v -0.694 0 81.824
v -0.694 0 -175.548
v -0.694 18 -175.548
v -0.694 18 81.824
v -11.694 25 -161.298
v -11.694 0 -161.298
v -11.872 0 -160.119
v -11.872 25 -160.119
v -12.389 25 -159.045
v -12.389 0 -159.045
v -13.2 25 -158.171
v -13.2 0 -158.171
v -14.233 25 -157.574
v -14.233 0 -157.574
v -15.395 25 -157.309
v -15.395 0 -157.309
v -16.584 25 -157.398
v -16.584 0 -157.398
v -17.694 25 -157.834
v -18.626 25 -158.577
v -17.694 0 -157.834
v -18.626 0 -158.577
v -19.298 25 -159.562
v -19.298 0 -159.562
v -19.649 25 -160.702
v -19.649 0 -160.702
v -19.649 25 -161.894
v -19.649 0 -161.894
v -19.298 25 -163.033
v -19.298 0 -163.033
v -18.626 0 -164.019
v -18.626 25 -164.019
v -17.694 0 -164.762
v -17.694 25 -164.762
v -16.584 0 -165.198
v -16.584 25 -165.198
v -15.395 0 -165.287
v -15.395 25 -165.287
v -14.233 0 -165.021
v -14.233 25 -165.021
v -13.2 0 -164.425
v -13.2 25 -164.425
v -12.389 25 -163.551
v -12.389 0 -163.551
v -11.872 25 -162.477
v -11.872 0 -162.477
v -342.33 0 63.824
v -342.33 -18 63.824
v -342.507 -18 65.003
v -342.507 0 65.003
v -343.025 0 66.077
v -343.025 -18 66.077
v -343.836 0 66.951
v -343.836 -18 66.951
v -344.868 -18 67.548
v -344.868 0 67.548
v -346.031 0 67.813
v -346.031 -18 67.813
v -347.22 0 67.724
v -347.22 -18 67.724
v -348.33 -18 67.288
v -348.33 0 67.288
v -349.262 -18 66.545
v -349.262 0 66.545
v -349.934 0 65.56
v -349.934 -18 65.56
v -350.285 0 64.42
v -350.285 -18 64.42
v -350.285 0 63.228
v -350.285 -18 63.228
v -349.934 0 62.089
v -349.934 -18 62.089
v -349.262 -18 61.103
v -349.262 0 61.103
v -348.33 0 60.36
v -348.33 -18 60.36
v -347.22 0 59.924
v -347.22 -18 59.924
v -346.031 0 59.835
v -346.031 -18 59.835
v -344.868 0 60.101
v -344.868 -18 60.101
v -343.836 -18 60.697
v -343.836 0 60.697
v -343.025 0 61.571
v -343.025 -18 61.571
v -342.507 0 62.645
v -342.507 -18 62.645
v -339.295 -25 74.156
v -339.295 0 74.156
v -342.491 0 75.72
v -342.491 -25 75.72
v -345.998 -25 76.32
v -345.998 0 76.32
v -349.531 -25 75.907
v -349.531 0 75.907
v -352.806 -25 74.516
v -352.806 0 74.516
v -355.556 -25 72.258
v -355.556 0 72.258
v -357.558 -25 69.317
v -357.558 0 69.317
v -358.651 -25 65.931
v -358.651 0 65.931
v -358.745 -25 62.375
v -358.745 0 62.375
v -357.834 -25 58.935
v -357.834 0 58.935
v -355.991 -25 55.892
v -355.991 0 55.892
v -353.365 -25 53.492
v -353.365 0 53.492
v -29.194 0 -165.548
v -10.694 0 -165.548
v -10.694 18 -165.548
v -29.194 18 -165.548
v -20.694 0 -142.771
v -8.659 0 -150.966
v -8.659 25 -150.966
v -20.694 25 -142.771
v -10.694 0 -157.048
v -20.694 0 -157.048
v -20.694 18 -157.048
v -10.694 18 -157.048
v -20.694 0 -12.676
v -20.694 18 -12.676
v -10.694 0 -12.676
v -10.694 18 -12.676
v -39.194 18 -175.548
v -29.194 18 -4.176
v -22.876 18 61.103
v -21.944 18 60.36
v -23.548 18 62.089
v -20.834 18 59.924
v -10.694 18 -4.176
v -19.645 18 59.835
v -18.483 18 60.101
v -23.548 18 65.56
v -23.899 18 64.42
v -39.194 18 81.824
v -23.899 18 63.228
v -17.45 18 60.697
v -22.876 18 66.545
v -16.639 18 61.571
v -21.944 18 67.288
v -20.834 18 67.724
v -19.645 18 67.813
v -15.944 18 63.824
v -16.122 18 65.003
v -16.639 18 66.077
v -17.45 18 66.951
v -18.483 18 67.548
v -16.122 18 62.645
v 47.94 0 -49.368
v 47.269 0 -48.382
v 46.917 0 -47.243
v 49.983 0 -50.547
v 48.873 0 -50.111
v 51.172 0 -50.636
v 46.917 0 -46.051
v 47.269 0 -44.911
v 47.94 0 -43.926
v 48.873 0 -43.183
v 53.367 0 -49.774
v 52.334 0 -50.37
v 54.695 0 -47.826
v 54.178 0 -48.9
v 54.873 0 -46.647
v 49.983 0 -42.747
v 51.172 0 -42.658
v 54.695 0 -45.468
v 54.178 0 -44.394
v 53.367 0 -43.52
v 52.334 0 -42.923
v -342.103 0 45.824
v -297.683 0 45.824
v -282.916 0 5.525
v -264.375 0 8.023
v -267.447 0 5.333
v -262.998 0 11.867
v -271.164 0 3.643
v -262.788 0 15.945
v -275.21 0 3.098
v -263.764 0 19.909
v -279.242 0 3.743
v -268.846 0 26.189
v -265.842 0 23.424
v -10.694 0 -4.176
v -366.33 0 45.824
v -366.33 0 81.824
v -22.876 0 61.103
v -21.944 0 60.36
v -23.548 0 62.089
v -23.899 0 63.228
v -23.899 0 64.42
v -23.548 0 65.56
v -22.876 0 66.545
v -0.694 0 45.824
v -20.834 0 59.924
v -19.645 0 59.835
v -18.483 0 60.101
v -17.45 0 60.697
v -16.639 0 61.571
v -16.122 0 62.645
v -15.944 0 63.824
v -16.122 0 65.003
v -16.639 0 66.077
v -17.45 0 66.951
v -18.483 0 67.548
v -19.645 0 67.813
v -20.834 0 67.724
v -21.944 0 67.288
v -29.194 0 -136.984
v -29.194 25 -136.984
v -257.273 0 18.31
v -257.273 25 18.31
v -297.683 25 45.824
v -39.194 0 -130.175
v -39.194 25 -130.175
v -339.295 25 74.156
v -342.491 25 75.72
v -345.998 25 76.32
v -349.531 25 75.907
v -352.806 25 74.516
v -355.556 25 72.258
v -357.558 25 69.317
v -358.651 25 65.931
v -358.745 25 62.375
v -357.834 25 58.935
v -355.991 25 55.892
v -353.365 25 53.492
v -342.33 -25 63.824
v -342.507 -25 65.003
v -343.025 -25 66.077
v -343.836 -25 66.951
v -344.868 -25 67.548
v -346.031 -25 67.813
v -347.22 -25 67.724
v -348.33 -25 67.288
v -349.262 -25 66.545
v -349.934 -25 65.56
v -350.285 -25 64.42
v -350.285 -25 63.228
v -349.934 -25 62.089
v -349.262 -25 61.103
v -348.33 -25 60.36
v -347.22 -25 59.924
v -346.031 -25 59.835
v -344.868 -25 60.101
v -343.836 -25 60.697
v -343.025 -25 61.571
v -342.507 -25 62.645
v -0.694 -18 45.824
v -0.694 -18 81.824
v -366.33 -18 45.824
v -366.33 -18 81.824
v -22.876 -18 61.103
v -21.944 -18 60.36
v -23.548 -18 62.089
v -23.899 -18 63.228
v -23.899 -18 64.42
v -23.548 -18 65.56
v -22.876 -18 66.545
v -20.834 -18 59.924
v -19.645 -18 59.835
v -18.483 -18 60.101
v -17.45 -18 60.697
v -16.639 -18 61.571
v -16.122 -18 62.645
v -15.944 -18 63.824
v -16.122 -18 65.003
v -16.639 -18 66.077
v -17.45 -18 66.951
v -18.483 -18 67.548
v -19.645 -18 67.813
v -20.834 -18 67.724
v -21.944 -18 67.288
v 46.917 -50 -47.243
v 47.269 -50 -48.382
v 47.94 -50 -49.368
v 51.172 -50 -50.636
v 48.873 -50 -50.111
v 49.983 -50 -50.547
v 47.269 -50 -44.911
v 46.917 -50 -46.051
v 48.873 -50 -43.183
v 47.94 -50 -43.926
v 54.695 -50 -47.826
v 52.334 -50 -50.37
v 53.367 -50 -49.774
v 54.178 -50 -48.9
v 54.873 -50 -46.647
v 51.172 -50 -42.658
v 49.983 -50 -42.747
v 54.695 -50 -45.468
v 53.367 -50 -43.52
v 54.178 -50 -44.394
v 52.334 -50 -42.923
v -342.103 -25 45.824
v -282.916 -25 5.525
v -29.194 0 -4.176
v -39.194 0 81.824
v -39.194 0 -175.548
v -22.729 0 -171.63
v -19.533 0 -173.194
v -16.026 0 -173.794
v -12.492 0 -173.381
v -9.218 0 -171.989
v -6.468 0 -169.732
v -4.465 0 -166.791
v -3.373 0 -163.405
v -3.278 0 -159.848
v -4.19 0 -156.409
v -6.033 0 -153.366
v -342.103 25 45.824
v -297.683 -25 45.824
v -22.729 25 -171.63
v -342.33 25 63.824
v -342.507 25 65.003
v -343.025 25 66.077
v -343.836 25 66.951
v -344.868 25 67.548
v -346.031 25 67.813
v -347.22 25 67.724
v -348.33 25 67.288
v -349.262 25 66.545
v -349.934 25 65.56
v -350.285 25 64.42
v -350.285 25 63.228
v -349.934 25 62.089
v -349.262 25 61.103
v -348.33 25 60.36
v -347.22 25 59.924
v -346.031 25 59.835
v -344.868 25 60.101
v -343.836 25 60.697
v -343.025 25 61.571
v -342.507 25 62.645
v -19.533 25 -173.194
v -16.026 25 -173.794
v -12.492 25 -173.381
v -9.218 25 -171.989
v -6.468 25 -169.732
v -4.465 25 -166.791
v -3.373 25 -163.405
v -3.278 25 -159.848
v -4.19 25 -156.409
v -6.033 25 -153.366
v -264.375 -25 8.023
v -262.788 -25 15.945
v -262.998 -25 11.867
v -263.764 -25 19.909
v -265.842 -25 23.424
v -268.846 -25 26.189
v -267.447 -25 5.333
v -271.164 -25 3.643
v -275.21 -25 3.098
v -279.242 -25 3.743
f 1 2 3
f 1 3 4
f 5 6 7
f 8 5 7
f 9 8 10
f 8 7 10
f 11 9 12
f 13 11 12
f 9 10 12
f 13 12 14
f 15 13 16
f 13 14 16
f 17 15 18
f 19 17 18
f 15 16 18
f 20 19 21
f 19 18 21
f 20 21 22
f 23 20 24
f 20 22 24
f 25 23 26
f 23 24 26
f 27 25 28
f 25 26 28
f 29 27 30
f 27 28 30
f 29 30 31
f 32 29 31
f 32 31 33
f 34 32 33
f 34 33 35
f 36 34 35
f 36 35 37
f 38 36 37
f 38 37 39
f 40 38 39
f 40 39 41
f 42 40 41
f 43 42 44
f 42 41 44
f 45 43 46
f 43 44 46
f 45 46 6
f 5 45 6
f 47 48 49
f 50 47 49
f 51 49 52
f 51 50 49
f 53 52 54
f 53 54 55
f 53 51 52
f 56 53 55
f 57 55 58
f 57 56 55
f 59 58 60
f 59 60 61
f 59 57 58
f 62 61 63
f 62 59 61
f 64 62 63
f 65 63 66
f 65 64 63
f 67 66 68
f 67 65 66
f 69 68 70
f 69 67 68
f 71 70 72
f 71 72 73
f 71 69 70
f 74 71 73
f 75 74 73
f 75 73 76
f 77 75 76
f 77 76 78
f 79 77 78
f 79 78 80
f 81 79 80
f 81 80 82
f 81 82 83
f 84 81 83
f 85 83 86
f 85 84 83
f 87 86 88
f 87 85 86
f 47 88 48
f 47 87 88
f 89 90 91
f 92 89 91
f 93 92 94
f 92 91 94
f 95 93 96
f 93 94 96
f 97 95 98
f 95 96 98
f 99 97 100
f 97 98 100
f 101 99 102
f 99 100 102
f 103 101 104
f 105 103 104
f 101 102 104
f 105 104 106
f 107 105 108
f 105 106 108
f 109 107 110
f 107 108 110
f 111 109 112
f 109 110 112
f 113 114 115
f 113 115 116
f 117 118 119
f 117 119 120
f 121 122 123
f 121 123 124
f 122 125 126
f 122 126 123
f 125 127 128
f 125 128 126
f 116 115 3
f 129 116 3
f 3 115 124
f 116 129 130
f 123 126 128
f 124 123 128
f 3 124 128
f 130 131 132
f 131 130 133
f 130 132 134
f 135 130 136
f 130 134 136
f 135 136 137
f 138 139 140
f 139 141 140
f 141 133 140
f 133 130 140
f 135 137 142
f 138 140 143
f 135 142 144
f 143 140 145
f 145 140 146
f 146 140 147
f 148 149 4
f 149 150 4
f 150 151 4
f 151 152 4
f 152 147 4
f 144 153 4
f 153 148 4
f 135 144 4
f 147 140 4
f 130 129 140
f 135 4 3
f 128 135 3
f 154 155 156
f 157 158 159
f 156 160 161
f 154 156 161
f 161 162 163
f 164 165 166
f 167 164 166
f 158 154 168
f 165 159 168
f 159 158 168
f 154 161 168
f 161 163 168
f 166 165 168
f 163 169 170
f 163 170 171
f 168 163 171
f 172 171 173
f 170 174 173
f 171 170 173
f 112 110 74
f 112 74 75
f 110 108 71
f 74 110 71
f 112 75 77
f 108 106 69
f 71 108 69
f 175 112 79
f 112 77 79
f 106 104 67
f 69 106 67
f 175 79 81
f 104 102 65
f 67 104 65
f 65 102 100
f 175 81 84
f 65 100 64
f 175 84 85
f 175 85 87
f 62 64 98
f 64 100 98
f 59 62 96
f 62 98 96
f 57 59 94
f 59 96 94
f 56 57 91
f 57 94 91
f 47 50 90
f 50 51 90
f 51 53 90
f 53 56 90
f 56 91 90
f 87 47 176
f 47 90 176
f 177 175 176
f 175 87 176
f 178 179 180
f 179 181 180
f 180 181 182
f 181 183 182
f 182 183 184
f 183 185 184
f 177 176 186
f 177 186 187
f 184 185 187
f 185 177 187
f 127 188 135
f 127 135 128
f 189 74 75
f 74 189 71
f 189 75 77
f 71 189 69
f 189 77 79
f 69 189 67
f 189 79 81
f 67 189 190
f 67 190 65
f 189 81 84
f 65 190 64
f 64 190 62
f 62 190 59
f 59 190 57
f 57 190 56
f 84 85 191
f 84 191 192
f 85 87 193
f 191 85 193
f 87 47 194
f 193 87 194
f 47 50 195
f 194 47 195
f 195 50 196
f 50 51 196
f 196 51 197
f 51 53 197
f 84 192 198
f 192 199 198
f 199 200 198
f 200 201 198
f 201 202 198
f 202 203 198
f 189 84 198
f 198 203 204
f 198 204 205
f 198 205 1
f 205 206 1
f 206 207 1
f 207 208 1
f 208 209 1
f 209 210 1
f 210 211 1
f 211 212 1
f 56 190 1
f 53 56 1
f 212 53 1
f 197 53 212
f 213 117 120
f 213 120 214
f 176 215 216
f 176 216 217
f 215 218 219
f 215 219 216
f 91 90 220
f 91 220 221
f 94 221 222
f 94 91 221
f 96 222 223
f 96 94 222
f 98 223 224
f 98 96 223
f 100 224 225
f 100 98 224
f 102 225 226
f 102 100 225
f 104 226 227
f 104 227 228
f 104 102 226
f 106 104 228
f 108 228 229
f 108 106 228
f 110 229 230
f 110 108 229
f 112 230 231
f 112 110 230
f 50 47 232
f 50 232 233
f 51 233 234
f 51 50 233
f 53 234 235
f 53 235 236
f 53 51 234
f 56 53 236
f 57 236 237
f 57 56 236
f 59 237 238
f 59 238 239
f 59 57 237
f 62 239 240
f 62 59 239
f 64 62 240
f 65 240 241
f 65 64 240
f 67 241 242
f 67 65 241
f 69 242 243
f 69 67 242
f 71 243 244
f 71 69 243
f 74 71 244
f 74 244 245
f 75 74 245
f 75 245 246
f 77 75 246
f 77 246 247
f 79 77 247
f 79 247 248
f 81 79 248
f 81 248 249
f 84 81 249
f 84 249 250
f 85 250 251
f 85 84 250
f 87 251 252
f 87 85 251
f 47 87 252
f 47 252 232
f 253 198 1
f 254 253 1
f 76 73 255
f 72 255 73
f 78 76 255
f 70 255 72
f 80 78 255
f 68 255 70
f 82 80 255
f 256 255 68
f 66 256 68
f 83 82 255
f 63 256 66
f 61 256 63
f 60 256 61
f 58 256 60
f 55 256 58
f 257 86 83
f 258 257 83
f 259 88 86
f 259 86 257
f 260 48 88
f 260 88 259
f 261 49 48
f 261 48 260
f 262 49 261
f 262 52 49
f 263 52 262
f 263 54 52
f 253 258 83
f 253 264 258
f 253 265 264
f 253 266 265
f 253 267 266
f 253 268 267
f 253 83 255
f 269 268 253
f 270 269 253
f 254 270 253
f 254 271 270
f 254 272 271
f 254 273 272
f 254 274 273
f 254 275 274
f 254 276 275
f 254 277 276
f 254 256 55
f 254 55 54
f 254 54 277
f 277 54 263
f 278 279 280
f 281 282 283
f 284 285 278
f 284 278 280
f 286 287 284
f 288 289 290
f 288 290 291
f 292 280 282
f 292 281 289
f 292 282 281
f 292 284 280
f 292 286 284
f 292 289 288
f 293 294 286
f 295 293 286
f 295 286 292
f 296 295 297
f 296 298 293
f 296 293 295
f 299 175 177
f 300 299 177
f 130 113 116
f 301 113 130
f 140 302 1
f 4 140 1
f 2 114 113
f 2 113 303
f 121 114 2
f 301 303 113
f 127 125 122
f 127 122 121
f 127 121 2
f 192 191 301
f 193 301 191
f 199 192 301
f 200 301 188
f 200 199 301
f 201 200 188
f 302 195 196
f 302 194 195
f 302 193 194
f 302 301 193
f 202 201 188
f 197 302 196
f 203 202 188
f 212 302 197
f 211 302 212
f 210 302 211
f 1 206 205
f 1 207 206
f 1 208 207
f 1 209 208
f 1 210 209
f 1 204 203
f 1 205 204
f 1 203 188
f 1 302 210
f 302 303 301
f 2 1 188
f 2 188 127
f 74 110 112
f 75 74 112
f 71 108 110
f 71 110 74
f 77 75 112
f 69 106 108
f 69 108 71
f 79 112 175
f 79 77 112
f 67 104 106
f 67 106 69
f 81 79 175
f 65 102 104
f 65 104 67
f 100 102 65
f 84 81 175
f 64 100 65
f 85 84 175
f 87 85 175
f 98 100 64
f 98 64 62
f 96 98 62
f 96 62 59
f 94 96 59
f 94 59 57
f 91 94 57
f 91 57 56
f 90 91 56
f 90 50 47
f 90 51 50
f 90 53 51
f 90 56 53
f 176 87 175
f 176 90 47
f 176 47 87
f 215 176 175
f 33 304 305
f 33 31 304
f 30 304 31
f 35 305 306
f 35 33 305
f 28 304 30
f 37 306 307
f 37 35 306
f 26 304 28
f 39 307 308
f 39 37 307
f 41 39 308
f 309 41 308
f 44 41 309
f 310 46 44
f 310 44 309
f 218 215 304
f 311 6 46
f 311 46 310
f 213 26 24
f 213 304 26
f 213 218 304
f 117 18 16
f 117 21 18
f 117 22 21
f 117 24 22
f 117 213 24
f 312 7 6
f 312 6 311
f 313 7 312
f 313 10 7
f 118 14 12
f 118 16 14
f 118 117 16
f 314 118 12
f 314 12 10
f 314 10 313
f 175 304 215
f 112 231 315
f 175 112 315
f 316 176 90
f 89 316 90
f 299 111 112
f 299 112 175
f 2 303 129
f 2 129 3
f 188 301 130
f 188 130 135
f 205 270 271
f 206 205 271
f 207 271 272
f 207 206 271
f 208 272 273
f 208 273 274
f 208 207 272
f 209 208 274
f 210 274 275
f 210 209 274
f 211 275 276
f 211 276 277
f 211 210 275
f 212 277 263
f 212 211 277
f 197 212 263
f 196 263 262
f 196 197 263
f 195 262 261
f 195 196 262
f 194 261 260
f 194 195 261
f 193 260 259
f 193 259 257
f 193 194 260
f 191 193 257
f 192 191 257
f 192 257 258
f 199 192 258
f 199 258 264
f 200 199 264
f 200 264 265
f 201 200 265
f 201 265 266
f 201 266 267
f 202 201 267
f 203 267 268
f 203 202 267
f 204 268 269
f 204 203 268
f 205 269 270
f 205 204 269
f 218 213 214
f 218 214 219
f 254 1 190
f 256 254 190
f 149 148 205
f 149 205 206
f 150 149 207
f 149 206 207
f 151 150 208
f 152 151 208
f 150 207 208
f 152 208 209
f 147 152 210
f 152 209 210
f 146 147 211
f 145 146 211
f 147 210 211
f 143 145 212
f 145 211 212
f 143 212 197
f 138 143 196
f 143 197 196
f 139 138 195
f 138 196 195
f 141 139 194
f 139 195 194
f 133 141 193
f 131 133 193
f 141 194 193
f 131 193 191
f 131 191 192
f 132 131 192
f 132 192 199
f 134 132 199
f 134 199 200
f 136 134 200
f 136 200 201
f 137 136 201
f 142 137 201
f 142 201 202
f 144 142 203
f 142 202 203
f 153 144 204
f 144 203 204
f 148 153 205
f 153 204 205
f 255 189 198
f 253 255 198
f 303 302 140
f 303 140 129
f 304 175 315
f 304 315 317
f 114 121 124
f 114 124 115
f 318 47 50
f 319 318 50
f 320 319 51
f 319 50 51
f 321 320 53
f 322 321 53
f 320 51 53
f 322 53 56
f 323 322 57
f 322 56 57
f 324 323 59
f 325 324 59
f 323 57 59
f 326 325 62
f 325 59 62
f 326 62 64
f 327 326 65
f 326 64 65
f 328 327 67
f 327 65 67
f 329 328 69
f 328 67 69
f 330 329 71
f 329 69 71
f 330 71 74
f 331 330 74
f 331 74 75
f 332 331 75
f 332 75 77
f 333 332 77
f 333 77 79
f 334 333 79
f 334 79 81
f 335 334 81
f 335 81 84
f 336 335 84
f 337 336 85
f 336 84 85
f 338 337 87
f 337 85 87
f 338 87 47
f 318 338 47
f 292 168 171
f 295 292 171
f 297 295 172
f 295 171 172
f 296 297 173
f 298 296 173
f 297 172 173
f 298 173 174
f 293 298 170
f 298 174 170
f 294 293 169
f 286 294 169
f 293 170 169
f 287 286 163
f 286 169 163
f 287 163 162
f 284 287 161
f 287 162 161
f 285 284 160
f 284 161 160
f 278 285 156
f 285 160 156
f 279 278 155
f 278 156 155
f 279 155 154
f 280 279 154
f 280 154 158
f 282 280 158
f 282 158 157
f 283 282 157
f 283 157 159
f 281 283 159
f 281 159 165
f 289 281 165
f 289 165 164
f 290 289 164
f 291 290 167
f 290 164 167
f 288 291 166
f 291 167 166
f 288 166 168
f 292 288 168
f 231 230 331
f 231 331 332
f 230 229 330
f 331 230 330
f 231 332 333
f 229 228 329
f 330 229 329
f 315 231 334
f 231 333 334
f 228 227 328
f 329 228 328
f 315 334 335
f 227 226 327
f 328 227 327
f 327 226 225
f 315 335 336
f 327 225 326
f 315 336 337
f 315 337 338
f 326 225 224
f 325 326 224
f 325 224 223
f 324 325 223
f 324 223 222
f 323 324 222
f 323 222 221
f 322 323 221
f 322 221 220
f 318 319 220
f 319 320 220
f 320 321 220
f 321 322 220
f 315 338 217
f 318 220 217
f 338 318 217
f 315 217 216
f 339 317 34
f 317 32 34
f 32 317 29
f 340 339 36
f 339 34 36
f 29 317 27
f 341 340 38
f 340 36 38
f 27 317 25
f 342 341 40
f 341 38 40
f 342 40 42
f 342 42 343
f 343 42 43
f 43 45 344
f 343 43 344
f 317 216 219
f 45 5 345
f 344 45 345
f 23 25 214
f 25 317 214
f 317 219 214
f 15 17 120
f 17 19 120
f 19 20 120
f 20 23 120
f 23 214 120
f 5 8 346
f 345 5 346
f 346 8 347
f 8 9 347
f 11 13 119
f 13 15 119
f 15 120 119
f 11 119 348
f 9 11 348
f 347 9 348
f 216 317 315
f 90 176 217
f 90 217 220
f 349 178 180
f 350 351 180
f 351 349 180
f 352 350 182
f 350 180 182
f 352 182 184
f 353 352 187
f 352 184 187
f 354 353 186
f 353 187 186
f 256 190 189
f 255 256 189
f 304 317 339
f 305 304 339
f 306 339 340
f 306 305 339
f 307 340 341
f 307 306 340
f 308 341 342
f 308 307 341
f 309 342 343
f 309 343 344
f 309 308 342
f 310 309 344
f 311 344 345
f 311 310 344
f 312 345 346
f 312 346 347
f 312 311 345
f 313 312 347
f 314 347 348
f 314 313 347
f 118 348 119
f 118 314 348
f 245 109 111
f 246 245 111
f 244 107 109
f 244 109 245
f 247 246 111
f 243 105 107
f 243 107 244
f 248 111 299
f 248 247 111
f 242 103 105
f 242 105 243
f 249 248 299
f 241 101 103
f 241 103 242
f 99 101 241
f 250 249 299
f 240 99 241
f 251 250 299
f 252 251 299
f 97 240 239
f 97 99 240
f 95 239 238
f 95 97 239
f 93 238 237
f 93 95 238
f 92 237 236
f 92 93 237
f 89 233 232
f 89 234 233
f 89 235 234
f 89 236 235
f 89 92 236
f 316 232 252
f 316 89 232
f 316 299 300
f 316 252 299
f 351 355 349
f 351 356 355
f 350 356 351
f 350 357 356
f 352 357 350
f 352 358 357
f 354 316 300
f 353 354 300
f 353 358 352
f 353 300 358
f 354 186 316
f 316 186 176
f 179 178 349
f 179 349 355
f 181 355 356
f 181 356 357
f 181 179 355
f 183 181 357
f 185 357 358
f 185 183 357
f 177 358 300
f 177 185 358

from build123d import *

# Parameters (mm, degrees)
F0_W        = 38.5
F0_H        = 36
F0_R        = 4
F1_DEPTH    = 18
F2_DEPTH    = 18
F3_DEPTH    = 25
F4_R        = 4
F5_DEPTH    = 50
F6_DEPTH    = 25
F7_T1_DEPTH = 95


# Not quite as in the source:
# - a fillet or chamfer that OpenCascade refuses, or shapes differently, is made with other operations: its cross-section is extruded or revolved along the edge and cut away or added


with BuildPart() as f1:
    # F0 (on Front) → F1 (new body)
    with BuildSketch(Plane.XZ):
        with Locations((-19.9438821999, 63.8240744194)):
            Rectangle(F0_W, F0_H)
        with Locations((-19.9438821999, 63.8240744194)):
            Circle(F0_R, mode=Mode.SUBTRACT)
        with BuildLine():
            Line((-0.6938821999, 45.8240744194), (-39.1938821999, 45.8240744194))
            Line((-39.1938821999, 45.8240744194), (-39.1938821999, -130.1749886339))
            Line((-39.1938821999, -130.1749886339), (-29.1938821999, -136.9837487019))
            Line((-29.1938821999, -136.9837487019), (-29.1938821999, -4.1759255806))
            Line((-29.1938821999, -4.1759255806), (-10.6938821999, -4.1759255806))
            Line((-10.6938821999, -4.1759255806), (-10.6938821999, -12.6759255806))
            Line((-10.6938821999, -12.6759255806), (-20.6938821999, -12.6759255806))
            Line((-20.6938821999, -12.6759255806), (-20.6938821999, -142.7711947596))
            Line((-20.6938821999, -142.7711947596), (-8.658818896, -150.9655806035))
            ThreePointArc((-8.658818896, -150.9655806035), (-5.3615114985, -168.3330146088), (-22.7289455038, -171.6303220062))
            Line((-22.7289455038, -171.6303220062), (-39.1938821999, -160.4197416564))
            Line((-39.1938821999, -160.4197416564), (-39.1938821999, -175.5479513049))
            Line((-39.1938821999, -175.5479513049), (-0.6938821999, -175.5479513049))
            Line((-0.6938821999, -175.5479513049), (-0.6938821999, 45.8240744194))
        make_face()
        with BuildLine():
            Line((-29.1938821999, -136.9837487019), (-39.1938821999, -130.1749886339))
            Line((-39.1938821999, -130.1749886339), (-39.1938821999, -160.4197416564))
            Line((-39.1938821999, -160.4197416564), (-22.7289455038, -171.6303220062))
            ThreePointArc((-22.7289455038, -171.6303220062), (-5.3615114985, -168.3330146088), (-8.658818896, -150.9655806035))
            Line((-8.658818896, -150.9655806035), (-20.6938821999, -142.7711947596))
            Line((-20.6938821999, -142.7711947596), (-20.6938821999, -157.0479513049))
            Line((-20.6938821999, -157.0479513049), (-10.6938821999, -157.0479513049))
            Line((-10.6938821999, -157.0479513049), (-10.6938821999, -165.5479513049))
            Line((-10.6938821999, -165.5479513049), (-29.1938821999, -165.5479513049))
            Line((-29.1938821999, -165.5479513049), (-29.1938821999, -136.9837487019))
        make_face()
    extrude(amount=-F1_DEPTH)


with BuildPart() as f2:
    # F0 (on Front) → F2 (new body)
    with BuildSketch(Plane.XZ):
        with BuildLine():
            Line((-39.1938821999, 45.8240744194), (-39.1938821999, 81.8240744194))
            Line((-39.1938821999, 81.8240744194), (-366.3297446435, 81.8240744194))
            Line((-366.3297446435, 81.8240744194), (-366.3297446435, 45.8240744194))
            Line((-366.3297446435, 45.8240744194), (-342.1033899768, 45.8240744194))
            Line((-342.1033899768, 45.8240744194), (-353.3648079474, 53.491703718))
            ThreePointArc((-353.3648079474, 53.491703718), (-356.6621153449, 70.8591377232), (-339.2946813396, 74.1564451207))
            Line((-339.2946813396, 74.1564451207), (-297.6830363138, 45.8240744194))
            Line((-297.6830363138, 45.8240744194), (-39.1938821999, 45.8240744194))
        make_face()
        with Locations((-19.9438821999, 63.8240744194)):
            Rectangle(F0_W, F0_H)
        with Locations((-19.9438821999, 63.8240744194)):
            Circle(F0_R, mode=Mode.SUBTRACT)
        with BuildLine():
            Line((-342.1033899768, 45.8240744194), (-297.6830363138, 45.8240744194))
            Line((-297.6830363138, 45.8240744194), (-339.2946813396, 74.1564451207))
            ThreePointArc((-339.2946813396, 74.1564451207), (-356.6621153449, 70.8591377232), (-353.3648079474, 53.491703718))
            Line((-353.3648079474, 53.491703718), (-342.1033899768, 45.8240744194))
        make_face()
        with Locations((-346.3297446435, 63.8240744194)):
            Circle(F0_R, mode=Mode.SUBTRACT)
    extrude(amount=F2_DEPTH)


with BuildPart() as f3:
    # F0 (on Front) → F3 (new body)
    with BuildSketch(Plane.XZ):
        with BuildLine():
            Line((-29.1938821999, -136.9837487019), (-39.1938821999, -130.1749886339))
            Line((-39.1938821999, -130.1749886339), (-39.1938821999, -160.4197416564))
            Line((-39.1938821999, -160.4197416564), (-22.7289455038, -171.6303220062))
            ThreePointArc((-22.7289455038, -171.6303220062), (-5.3615114985, -168.3330146088), (-8.658818896, -150.9655806035))
            Line((-8.658818896, -150.9655806035), (-20.6938821999, -142.7711947596))
            Line((-20.6938821999, -142.7711947596), (-20.6938821999, -157.0479513049))
            Line((-20.6938821999, -157.0479513049), (-10.6938821999, -157.0479513049))
            Line((-10.6938821999, -157.0479513049), (-10.6938821999, -165.5479513049))
            Line((-10.6938821999, -165.5479513049), (-29.1938821999, -165.5479513049))
            Line((-29.1938821999, -165.5479513049), (-29.1938821999, -136.9837487019))
        make_face()
        Polygon((-39.1938821999, -160.4197416564), (-39.1938821999, -130.1749886339), (-257.2734515904, 18.3101577365), (-271.3435781981, -2.3545836662), align=None)
        Polygon((-20.6938821999, -142.7711947596), (-29.1938821999, -136.9837487019), (-29.1938821999, -165.5479513049), (-10.6938821999, -165.5479513049), (-10.6938821999, -157.0479513049), (-20.6938821999, -157.0479513049), align=None)
        with Locations((-15.6938821999, -161.2979513049)):
            Circle(F0_R, mode=Mode.SUBTRACT)
        with BuildLine():
            Line((-342.1033899768, 45.8240744194), (-297.6830363138, 45.8240744194))
            Line((-297.6830363138, 45.8240744194), (-339.2946813396, 74.1564451207))
            ThreePointArc((-339.2946813396, 74.1564451207), (-356.6621153449, 70.8591377232), (-353.3648079474, 53.491703718))
            Line((-353.3648079474, 53.491703718), (-342.1033899768, 45.8240744194))
        make_face()
        with Locations((-346.3297446435, 63.8240744194)):
            Circle(F0_R, mode=Mode.SUBTRACT)
        Polygon((-257.2734515904, 18.3101577365), (-297.6830363138, 45.8240744194), (-342.1033899768, 45.8240744194), (-271.3435781981, -2.3545836662), align=None)
    extrude(amount=-F3_DEPTH)


with BuildPart() as f5:
    # F4 (on Front) → F5 (new body)
    with BuildSketch(Plane.XZ):
        with Locations((50.8726574481, -46.6468930244)):
            Circle(F4_R)
    extrude(amount=F5_DEPTH)


with BuildPart() as f6:
    # F0 (on Front) → F6 (new body)
    with BuildSketch(Plane.XZ):
        Polygon((-257.2734515904, 18.3101577365), (-297.6830363138, 45.8240744194), (-342.1033899768, 45.8240744194), (-271.3435781981, -2.3545836662), align=None)
        with BuildLine():
            Line((-342.1033899768, 45.8240744194), (-297.6830363138, 45.8240744194))
            Line((-297.6830363138, 45.8240744194), (-339.2946813396, 74.1564451207))
            ThreePointArc((-339.2946813396, 74.1564451207), (-356.6621153449, 70.8591377232), (-353.3648079474, 53.491703718))
            Line((-353.3648079474, 53.491703718), (-342.1033899768, 45.8240744194))
        make_face()
        with Locations((-346.3297446435, 63.8240744194)):
            Circle(F0_R, mode=Mode.SUBTRACT)
    extrude(amount=F6_DEPTH)

    # F7: fillet of radius 14 on 2 edges, made by hand

    # F7_s2 → F7_t1 (cut)
    with BuildSketch(Plane.XZ.offset(-35)):
        with BuildLine():
            ThreePointArc((-265.1527224907, 6.737902551), (-262.9706716765, 17.2285076822), (-268.8457067759, 26.1894286369))
            Line((-268.8457067759, 26.1894286369), (-257.2734515904, 18.3101577365))
            Line((-257.2734515904, 18.3101577365), (-265.1527224907, 6.737902551))
        make_face()
        with BuildLine():
            ThreePointArc((-263.4643072978, 9.2176715193), (-272.4252282525, 3.3426364199), (-282.9158333837, 5.5246872342))
            Line((-282.9158333837, 5.5246872342), (-271.3435781981, -2.3545836662))
            Line((-271.3435781981, -2.3545836662), (-263.4643072978, 9.2176715193))
        make_face()
    extrude(amount=F7_T1_DEPTH, mode=Mode.SUBTRACT)


solid = Compound([f1.part, f2.part, f3.part, f5.part, f6.part])
